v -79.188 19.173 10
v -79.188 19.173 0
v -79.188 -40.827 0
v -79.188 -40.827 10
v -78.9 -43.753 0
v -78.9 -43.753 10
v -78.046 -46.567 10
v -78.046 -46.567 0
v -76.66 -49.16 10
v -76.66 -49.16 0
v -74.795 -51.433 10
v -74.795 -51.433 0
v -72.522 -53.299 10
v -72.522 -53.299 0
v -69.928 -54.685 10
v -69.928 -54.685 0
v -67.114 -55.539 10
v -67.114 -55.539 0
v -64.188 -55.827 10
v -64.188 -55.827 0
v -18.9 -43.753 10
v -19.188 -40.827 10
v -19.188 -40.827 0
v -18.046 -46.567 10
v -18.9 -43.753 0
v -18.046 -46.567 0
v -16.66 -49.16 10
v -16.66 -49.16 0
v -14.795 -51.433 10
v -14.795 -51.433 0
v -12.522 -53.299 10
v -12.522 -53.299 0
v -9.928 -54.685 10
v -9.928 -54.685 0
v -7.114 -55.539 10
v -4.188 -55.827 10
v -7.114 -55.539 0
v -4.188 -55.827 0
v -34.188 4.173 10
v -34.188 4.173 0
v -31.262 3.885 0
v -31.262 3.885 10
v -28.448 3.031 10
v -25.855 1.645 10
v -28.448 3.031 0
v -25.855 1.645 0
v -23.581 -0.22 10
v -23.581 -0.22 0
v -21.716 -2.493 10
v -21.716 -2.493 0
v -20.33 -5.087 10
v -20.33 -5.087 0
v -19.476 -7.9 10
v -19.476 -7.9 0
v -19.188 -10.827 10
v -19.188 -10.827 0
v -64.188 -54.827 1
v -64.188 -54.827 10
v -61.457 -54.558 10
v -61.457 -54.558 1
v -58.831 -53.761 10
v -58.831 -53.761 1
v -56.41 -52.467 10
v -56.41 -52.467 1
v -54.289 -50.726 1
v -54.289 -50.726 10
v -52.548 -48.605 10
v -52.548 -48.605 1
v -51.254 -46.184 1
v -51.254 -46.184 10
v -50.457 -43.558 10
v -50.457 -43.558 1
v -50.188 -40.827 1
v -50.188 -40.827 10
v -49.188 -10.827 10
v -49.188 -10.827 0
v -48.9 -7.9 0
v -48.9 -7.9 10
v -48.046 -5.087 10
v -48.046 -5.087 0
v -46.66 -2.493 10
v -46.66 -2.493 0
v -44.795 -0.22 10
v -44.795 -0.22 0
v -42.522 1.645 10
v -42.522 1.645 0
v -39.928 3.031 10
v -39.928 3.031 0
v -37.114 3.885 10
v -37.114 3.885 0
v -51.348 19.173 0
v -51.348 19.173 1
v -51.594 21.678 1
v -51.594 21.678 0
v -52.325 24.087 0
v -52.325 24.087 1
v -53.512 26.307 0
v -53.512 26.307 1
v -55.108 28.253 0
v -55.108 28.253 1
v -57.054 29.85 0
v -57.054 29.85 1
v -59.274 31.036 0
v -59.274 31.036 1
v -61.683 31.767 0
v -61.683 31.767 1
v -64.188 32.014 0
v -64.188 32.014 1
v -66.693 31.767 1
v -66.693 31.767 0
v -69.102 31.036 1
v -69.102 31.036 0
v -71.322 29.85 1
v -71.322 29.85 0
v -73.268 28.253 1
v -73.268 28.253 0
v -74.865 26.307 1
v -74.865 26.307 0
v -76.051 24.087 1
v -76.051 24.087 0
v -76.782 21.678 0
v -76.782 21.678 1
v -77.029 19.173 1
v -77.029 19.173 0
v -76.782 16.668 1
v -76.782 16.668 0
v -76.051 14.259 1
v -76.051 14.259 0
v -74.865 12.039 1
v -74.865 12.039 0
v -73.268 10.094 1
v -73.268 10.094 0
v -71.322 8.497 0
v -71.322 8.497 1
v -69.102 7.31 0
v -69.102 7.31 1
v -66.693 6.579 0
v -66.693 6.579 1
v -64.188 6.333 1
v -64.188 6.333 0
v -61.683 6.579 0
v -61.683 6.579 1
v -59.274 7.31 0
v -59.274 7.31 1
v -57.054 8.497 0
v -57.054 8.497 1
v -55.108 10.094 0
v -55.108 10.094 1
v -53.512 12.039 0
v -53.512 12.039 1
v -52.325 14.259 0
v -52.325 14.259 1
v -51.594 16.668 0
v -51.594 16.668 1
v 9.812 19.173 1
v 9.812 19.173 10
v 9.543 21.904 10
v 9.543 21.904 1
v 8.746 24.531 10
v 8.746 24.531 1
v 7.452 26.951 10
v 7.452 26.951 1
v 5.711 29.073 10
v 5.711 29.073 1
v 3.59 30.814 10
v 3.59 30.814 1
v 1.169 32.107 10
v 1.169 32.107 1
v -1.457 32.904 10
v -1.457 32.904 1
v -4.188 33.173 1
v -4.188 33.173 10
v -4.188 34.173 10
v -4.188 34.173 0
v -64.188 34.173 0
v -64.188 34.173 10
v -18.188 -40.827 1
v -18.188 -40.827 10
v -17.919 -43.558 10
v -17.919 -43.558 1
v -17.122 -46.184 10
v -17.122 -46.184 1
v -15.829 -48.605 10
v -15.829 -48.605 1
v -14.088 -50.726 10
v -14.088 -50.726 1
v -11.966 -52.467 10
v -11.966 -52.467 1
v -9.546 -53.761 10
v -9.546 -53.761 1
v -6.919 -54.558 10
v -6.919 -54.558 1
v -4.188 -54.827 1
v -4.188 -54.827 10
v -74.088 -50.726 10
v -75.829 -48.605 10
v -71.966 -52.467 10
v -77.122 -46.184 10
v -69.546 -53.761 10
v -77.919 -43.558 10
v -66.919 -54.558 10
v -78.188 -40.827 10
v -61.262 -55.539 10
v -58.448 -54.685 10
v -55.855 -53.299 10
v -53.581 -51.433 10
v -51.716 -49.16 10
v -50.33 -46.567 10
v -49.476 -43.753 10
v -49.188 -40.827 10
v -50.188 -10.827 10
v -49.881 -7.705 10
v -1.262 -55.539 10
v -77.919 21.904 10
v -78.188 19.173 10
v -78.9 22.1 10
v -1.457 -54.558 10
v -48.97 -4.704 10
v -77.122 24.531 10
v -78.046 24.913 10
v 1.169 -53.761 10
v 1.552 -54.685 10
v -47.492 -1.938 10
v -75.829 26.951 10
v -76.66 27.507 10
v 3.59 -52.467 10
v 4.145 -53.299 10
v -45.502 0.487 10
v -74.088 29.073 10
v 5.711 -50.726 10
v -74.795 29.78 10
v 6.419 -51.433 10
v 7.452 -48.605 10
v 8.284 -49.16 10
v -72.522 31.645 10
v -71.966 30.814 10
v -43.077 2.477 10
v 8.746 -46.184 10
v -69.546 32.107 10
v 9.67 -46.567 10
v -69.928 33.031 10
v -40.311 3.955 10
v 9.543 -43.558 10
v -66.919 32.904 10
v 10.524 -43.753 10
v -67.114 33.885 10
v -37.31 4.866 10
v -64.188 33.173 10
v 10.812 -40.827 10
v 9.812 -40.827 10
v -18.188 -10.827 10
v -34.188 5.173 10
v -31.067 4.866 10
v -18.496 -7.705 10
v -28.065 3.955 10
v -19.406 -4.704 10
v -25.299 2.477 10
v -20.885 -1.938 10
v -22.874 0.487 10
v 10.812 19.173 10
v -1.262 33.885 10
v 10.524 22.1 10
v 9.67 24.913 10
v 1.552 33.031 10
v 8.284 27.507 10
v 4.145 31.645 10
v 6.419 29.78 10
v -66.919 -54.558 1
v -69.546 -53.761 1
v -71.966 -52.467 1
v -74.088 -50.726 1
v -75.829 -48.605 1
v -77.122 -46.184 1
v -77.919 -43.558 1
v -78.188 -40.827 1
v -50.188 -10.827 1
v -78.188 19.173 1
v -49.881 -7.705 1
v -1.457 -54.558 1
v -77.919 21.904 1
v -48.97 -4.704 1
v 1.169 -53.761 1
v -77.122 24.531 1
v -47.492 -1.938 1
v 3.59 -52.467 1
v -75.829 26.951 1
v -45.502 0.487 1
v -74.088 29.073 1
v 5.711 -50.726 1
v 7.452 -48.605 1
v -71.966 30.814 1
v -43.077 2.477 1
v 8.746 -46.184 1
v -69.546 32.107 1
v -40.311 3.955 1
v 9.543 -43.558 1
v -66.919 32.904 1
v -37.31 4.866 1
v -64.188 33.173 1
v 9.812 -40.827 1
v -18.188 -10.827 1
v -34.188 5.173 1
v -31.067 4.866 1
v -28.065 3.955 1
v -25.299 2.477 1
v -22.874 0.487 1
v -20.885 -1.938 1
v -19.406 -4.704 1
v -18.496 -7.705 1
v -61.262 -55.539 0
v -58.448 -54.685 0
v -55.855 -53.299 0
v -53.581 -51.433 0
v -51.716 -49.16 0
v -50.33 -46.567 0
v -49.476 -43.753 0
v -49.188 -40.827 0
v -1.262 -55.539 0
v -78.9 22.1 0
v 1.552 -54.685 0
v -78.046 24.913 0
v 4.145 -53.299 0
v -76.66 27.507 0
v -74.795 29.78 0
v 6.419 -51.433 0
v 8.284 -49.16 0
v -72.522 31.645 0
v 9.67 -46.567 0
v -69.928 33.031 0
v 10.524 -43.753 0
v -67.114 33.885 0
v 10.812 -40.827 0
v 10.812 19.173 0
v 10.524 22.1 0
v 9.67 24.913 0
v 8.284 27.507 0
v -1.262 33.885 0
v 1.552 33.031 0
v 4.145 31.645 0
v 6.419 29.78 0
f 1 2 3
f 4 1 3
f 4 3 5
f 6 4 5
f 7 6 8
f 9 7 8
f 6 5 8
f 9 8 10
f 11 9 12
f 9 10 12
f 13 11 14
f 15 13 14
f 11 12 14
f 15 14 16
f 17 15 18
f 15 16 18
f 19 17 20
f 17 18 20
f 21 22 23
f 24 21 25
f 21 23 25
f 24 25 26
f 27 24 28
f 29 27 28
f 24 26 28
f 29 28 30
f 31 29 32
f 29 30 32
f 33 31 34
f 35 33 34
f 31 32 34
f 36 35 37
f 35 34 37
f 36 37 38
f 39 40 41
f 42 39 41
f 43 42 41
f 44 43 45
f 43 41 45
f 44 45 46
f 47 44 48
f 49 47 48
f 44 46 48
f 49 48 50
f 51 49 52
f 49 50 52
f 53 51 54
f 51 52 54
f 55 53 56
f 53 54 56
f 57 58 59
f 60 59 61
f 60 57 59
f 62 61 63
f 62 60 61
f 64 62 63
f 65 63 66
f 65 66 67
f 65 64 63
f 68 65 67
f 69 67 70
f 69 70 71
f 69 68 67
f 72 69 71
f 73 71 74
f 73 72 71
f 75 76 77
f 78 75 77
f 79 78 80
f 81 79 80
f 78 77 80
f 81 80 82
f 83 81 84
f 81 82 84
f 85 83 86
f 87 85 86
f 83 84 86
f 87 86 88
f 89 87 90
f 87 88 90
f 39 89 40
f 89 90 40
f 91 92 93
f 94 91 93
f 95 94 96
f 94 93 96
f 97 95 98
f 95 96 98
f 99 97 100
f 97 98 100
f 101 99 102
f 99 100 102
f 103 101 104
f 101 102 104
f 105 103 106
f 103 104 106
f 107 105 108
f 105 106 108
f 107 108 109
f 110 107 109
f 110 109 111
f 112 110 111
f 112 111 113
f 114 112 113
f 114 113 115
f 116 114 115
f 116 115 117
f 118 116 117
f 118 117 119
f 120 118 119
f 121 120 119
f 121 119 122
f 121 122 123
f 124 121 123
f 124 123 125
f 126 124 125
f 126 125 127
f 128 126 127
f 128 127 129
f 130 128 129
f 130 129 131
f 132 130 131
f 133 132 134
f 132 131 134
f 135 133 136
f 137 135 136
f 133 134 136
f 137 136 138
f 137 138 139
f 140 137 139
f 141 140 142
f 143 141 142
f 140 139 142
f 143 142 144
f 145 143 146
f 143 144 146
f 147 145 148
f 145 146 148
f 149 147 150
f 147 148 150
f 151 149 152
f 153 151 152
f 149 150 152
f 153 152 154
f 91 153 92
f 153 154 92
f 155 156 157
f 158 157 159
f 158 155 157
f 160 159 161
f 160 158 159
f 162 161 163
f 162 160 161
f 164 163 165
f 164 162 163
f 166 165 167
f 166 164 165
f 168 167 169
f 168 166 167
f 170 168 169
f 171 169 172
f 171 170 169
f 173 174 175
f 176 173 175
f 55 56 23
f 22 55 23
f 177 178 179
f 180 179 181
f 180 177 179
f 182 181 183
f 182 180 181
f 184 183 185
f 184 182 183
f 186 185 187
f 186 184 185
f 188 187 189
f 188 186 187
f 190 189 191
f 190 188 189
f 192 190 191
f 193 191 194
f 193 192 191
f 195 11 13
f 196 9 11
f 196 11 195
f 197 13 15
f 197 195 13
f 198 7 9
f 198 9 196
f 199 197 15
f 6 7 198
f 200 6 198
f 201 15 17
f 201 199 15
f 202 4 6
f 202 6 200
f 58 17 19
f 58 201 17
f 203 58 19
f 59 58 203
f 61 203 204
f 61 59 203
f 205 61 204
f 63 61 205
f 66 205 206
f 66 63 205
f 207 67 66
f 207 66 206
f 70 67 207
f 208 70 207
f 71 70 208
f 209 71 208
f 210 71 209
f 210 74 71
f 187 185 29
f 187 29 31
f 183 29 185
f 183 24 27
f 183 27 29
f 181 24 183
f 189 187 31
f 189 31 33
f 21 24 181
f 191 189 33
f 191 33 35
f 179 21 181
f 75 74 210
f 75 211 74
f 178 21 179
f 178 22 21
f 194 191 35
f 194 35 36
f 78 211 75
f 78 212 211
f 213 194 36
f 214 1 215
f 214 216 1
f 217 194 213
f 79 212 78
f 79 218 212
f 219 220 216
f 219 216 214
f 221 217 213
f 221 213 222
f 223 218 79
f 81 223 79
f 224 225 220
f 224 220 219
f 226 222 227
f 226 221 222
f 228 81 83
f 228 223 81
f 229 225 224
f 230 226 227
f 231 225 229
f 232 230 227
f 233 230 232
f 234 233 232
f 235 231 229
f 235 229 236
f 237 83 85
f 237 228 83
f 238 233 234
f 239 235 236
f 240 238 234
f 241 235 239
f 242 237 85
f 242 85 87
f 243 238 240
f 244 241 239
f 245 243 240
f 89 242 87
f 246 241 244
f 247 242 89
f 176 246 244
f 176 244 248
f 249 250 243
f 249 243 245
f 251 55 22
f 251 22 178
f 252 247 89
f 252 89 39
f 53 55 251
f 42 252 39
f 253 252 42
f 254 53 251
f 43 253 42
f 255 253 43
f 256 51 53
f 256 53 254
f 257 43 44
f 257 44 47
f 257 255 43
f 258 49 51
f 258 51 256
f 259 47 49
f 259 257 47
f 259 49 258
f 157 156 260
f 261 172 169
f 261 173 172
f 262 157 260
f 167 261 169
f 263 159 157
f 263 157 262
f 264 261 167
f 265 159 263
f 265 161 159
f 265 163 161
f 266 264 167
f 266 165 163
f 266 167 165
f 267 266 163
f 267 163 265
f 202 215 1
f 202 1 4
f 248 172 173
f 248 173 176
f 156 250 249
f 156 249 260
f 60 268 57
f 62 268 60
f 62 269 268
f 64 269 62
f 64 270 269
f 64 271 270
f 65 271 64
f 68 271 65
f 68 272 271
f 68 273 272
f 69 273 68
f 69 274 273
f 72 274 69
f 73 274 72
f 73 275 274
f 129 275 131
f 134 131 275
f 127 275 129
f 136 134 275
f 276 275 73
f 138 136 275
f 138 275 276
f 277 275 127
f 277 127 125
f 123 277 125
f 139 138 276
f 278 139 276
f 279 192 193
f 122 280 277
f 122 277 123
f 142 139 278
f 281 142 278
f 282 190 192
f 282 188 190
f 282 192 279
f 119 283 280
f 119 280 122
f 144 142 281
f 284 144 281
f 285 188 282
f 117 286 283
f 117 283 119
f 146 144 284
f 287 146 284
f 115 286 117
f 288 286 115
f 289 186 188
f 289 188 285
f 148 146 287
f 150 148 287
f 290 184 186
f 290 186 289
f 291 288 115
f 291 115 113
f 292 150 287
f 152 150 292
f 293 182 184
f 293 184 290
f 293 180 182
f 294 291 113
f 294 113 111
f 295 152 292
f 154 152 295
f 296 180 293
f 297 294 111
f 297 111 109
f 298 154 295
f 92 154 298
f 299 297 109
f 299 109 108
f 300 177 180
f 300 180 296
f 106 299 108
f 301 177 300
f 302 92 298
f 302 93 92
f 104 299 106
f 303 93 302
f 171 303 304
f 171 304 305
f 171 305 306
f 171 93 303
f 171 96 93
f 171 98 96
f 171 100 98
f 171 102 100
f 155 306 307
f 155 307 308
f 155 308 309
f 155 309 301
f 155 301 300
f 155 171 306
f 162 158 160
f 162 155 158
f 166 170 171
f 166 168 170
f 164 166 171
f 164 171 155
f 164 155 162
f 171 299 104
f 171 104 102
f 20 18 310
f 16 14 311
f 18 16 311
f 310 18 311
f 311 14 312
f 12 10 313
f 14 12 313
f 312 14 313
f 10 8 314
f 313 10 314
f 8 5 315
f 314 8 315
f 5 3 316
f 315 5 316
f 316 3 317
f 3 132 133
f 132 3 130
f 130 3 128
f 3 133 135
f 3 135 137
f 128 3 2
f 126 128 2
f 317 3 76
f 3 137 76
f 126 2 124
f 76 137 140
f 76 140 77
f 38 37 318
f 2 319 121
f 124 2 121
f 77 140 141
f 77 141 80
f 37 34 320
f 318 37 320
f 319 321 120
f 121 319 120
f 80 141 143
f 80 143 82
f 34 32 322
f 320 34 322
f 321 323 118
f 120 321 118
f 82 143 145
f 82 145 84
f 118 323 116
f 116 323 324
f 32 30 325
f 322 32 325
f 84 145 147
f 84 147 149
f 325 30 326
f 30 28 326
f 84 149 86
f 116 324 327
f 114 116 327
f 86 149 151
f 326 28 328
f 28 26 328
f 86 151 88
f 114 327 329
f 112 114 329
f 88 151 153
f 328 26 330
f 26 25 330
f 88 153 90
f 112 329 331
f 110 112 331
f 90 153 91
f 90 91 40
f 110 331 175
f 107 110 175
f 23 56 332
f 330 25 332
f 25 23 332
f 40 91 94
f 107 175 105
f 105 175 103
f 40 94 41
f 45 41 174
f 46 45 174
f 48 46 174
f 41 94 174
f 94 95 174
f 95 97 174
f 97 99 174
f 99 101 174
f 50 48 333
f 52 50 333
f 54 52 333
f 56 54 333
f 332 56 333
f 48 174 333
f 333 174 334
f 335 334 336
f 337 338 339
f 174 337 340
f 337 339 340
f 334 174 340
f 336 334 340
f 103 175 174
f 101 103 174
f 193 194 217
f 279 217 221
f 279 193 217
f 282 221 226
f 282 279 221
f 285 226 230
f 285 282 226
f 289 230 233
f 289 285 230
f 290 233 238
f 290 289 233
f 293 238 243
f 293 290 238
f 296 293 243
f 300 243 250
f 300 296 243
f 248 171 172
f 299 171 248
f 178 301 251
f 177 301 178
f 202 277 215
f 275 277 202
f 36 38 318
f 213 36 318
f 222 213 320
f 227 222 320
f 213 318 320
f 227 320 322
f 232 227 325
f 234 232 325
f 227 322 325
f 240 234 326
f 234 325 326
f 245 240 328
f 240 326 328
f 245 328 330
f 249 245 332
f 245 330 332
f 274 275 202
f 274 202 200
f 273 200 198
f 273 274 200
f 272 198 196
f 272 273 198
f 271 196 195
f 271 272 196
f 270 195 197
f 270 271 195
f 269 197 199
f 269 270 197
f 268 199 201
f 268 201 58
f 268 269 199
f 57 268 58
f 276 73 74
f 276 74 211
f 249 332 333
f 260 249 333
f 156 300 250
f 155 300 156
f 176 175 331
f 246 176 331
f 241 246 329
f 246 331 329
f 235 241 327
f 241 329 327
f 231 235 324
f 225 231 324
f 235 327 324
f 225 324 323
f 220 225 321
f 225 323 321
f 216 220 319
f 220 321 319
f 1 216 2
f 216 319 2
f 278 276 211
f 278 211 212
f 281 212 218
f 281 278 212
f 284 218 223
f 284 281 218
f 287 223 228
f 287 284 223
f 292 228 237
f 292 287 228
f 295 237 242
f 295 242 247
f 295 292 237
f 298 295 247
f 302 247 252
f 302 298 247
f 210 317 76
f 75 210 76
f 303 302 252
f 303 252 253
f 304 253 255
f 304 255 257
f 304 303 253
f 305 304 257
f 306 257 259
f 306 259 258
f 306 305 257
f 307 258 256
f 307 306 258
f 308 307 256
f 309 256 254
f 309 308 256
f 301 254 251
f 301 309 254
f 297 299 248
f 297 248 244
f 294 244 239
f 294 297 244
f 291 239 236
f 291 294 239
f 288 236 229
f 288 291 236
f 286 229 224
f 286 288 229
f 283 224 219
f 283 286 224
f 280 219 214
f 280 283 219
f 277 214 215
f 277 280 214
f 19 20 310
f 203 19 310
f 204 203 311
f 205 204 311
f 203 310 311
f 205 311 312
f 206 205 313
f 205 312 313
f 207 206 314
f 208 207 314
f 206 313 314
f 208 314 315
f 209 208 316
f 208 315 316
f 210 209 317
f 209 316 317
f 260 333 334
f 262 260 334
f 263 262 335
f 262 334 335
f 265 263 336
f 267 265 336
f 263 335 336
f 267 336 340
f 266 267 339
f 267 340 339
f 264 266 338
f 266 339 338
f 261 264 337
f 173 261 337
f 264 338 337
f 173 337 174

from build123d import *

# Parameters (mm, degrees)
F1_DEPTH = 10
F2_T     = -1
F3_R     = 12.840511
F4_DEPTH = 25


with BuildPart() as f1:
    # F0 (on Top) → F1 (new body)
    with BuildSketch(Plane.XY):
        with BuildLine():
            Line((-4.188098, 34.173166), (-64.188098, 34.173166))
            ThreePointArc((-64.188098, 34.173166), (-74.7947, 29.779768), (-79.188098, 19.173166))
            Line((-79.188098, 19.173166), (-79.188098, -40.826834))
            ThreePointArc((-79.188098, -40.826834), (-74.7947, -51.433435), (-64.188098, -55.826834))
            ThreePointArc((-64.188098, -55.826834), (-53.581496, -51.433435), (-49.188098, -40.826834))
            Line((-49.188098, -40.826834), (-49.188098, -10.826834))
            ThreePointArc((-49.188098, -10.826834), (-44.7947, -0.220232), (-34.188098, 4.173166))
            ThreePointArc((-34.188098, 4.173166), (-23.581496, -0.220232), (-19.188098, -10.826834))
            Line((-19.188098, -10.826834), (-19.188098, -40.826834))
            ThreePointArc((-19.188098, -40.826834), (-14.7947, -51.433435), (-4.188098, -55.826834))
            ThreePointArc((-4.188098, -55.826834), (6.418504, -51.433435), (10.811902, -40.826834))
            Line((10.811902, -40.826834), (10.811902, 19.173166))
            ThreePointArc((10.811902, 19.173166), (6.418504, 29.779768), (-4.188098, 34.173166))
        make_face()
    extrude(amount=F1_DEPTH)

    # F2
    f2_openings = [f1.faces().sort_by_distance(p)[0] for p in [
        (-4.188098, -54.554042, 10),
    ]]
    offset(amount=F2_T, openings=f2_openings)

    # F3 (on face) → F4 (cut)
    with BuildSketch(Plane.XY.offset(1)):
        with Locations((-64.188098, 19.173166)):
            Circle(F3_R)
    extrude(amount=-F4_DEPTH, mode=Mode.SUBTRACT)


solid = f1.part
